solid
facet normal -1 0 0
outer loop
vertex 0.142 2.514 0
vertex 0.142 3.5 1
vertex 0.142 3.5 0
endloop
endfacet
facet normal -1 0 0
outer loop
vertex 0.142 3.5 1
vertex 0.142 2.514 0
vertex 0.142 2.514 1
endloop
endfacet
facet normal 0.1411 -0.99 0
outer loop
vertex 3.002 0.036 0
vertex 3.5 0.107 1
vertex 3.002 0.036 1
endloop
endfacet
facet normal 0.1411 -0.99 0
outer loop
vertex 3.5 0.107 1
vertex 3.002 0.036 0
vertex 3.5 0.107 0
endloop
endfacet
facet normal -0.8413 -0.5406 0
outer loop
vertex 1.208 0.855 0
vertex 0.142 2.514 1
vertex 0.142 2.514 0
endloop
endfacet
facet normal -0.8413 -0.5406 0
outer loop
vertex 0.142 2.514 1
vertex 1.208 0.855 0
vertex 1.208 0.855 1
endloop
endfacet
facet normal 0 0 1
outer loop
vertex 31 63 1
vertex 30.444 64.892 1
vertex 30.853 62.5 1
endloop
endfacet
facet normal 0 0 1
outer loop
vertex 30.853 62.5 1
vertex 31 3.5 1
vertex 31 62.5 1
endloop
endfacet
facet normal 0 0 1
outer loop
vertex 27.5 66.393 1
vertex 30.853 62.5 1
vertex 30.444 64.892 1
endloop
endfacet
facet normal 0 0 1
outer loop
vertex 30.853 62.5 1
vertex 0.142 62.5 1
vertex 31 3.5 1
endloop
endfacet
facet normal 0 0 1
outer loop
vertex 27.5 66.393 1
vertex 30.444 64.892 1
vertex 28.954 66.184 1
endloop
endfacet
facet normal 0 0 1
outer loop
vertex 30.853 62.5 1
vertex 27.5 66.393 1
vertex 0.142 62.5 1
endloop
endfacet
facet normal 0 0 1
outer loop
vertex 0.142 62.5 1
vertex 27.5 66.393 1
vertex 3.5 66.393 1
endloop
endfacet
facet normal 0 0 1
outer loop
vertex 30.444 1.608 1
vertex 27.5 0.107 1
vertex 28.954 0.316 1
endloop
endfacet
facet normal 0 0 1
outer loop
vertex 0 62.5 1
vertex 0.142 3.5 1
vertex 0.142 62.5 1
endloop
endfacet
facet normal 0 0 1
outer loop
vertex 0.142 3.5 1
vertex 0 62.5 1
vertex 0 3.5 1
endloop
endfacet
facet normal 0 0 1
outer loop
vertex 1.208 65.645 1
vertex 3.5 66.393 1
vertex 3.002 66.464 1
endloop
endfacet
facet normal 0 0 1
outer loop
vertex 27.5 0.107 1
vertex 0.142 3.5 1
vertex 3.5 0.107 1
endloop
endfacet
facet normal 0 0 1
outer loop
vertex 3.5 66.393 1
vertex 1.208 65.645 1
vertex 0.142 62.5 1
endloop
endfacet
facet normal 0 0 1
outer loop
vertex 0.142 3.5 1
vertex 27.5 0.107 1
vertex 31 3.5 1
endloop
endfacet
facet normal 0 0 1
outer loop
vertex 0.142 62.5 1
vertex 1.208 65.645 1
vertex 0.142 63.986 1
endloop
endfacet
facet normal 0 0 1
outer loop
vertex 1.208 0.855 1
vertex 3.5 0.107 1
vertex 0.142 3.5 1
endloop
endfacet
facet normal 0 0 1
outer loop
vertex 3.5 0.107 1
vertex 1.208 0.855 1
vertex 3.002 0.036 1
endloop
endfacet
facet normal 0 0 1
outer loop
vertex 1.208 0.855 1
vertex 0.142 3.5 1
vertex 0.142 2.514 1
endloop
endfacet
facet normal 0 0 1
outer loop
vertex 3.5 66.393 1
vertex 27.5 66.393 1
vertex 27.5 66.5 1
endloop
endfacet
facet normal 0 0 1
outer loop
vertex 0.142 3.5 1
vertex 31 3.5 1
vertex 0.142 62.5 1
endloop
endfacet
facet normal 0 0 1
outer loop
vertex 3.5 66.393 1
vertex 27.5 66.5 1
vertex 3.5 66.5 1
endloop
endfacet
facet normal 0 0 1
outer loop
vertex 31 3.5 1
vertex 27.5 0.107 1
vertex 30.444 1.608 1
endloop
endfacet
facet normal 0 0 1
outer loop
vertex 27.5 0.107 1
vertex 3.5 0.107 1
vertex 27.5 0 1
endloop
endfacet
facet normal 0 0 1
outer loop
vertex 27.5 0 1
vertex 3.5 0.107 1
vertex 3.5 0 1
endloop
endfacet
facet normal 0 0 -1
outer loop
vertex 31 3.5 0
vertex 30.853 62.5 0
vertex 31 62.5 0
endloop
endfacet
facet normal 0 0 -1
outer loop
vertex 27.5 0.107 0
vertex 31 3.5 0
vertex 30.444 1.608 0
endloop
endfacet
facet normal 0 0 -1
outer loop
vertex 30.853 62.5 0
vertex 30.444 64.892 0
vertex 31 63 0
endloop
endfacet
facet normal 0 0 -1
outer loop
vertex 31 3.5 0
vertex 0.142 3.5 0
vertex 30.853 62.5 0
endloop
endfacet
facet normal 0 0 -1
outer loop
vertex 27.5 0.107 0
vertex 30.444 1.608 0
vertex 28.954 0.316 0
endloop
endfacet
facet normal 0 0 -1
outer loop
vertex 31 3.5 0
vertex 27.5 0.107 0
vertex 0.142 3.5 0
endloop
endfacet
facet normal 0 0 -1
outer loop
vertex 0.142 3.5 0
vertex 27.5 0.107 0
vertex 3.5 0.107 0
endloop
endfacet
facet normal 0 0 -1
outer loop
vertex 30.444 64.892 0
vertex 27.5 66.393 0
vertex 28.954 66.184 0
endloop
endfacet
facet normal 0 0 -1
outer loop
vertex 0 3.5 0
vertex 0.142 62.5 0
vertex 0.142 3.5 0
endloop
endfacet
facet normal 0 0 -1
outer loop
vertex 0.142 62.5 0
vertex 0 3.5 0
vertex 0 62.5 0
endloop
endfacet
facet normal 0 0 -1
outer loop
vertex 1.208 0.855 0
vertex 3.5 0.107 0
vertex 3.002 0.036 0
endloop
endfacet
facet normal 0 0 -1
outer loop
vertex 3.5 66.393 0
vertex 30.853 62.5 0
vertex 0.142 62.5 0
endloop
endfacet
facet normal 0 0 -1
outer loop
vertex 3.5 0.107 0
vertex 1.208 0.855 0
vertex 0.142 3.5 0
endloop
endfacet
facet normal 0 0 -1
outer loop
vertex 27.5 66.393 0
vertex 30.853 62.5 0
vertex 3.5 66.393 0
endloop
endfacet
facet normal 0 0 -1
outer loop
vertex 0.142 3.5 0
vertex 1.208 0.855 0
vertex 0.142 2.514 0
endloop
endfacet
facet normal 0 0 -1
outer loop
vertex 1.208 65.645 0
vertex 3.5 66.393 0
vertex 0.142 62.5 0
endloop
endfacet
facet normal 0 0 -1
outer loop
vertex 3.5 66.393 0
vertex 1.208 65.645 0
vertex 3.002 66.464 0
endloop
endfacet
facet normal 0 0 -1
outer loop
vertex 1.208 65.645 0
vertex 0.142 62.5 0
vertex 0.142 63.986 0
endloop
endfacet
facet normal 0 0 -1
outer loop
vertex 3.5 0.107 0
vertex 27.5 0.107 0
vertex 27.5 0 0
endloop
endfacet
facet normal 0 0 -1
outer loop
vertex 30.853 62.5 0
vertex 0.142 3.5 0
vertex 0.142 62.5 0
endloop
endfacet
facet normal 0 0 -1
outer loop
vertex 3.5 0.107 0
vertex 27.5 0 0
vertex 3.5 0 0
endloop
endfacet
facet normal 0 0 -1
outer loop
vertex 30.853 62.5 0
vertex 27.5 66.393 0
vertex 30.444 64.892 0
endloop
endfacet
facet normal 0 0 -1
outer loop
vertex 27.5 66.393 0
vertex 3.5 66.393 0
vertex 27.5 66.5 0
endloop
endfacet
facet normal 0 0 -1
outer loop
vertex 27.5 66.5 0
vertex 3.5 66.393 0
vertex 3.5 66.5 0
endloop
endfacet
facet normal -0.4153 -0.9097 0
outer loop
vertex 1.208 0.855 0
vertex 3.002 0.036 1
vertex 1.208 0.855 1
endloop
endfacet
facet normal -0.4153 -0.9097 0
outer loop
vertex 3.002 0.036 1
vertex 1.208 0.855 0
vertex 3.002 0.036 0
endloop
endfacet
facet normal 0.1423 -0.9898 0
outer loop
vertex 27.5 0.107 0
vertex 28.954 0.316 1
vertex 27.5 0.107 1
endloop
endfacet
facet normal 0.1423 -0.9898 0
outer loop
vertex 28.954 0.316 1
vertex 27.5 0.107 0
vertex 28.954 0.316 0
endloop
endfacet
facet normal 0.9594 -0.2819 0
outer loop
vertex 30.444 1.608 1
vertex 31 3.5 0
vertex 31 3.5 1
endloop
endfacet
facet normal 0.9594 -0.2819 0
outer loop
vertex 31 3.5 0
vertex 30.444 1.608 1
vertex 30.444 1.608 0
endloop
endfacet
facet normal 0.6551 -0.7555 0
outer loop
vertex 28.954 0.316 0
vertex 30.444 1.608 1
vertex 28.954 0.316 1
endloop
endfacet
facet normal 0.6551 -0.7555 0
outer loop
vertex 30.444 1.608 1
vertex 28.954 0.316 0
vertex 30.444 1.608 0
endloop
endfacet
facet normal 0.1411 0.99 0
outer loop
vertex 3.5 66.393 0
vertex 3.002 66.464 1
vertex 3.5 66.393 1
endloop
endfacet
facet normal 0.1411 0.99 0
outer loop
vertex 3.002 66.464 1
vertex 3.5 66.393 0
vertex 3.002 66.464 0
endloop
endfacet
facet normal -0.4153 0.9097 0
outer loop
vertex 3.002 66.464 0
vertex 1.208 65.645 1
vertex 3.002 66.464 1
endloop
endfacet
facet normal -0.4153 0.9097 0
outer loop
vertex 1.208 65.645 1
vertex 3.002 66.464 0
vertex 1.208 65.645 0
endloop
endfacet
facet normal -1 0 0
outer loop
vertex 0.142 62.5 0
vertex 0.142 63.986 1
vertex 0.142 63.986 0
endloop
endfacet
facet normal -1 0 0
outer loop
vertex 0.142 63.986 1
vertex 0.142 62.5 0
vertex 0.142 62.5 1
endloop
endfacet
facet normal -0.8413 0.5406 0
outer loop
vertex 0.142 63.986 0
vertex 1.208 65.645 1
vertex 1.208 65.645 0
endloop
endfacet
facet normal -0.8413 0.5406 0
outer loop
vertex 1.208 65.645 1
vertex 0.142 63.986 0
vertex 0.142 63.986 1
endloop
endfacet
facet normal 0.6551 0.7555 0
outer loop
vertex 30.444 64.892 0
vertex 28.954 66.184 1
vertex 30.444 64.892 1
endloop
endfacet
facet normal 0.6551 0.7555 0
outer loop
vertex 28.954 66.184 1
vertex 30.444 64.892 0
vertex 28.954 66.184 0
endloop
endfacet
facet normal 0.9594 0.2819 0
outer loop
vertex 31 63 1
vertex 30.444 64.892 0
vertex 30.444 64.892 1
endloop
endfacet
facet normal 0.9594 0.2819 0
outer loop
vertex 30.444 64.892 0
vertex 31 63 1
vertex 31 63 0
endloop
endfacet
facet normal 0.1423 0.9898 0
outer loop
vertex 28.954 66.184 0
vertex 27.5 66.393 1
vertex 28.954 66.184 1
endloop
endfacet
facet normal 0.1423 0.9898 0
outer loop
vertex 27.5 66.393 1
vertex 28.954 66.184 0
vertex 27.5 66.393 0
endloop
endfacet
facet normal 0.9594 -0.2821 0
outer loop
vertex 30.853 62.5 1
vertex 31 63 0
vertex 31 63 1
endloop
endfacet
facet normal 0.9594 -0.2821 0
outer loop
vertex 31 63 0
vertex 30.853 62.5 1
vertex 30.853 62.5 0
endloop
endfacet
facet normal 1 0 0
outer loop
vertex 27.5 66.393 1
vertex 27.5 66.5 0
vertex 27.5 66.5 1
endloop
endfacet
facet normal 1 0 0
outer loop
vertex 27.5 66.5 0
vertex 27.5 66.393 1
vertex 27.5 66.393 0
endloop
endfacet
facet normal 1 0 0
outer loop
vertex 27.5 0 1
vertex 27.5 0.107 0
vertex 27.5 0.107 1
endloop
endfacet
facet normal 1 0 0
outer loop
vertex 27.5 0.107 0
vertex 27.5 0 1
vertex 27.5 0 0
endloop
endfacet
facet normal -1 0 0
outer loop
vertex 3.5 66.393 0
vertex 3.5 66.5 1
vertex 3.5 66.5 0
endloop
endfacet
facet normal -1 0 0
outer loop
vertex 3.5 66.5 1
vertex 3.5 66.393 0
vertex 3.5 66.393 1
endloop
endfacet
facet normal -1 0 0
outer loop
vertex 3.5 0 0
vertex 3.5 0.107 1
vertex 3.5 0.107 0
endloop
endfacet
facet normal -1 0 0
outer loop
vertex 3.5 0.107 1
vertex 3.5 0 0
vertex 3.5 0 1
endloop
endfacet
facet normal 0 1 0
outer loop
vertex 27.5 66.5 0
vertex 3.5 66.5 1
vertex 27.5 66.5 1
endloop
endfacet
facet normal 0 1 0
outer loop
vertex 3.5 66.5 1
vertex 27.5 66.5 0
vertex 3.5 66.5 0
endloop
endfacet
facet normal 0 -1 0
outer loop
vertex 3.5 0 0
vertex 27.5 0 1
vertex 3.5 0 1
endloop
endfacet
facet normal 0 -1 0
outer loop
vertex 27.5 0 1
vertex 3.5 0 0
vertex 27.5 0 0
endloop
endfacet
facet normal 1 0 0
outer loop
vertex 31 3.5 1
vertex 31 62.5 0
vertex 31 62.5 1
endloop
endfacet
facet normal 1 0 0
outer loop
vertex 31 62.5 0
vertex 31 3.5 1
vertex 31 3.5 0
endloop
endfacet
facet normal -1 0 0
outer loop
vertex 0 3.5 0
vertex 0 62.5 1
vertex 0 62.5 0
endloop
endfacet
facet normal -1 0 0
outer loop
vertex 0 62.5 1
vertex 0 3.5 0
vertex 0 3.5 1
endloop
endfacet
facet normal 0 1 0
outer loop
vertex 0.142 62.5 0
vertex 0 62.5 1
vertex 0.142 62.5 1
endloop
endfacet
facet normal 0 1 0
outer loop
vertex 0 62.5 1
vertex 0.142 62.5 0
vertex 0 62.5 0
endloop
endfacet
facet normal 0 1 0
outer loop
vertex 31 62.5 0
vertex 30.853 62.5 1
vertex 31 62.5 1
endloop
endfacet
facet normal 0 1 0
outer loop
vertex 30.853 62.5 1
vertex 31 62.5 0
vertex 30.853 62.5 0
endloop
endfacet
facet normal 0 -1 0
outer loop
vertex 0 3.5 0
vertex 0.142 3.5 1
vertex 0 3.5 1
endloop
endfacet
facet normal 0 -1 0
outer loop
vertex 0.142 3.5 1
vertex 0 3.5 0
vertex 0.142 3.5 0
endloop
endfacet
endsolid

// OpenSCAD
cornerRad = 3.5;
rpiOutline(1);

module rpiOutline(thick) {
    union() {
        translate([3.5,3.5,0]) corner(thick); // Lower Left
        translate([27.5,3.5,0]) corner(thick); // Lower Right
        translate([3.5,63,0]) corner(thick); //Upper Left
        translate([27.5,63,0]) corner(thick); // Upper Right
        translate([3.5,0,0]) cube([24,66.5,thick]); // Top and Bottom
        translate([0,3.5,0]) cube([31,59,thick]); // Sides
    }
}

module corner (thick) {
    cylinder(thick,cornerRad,cornerRad);
}
